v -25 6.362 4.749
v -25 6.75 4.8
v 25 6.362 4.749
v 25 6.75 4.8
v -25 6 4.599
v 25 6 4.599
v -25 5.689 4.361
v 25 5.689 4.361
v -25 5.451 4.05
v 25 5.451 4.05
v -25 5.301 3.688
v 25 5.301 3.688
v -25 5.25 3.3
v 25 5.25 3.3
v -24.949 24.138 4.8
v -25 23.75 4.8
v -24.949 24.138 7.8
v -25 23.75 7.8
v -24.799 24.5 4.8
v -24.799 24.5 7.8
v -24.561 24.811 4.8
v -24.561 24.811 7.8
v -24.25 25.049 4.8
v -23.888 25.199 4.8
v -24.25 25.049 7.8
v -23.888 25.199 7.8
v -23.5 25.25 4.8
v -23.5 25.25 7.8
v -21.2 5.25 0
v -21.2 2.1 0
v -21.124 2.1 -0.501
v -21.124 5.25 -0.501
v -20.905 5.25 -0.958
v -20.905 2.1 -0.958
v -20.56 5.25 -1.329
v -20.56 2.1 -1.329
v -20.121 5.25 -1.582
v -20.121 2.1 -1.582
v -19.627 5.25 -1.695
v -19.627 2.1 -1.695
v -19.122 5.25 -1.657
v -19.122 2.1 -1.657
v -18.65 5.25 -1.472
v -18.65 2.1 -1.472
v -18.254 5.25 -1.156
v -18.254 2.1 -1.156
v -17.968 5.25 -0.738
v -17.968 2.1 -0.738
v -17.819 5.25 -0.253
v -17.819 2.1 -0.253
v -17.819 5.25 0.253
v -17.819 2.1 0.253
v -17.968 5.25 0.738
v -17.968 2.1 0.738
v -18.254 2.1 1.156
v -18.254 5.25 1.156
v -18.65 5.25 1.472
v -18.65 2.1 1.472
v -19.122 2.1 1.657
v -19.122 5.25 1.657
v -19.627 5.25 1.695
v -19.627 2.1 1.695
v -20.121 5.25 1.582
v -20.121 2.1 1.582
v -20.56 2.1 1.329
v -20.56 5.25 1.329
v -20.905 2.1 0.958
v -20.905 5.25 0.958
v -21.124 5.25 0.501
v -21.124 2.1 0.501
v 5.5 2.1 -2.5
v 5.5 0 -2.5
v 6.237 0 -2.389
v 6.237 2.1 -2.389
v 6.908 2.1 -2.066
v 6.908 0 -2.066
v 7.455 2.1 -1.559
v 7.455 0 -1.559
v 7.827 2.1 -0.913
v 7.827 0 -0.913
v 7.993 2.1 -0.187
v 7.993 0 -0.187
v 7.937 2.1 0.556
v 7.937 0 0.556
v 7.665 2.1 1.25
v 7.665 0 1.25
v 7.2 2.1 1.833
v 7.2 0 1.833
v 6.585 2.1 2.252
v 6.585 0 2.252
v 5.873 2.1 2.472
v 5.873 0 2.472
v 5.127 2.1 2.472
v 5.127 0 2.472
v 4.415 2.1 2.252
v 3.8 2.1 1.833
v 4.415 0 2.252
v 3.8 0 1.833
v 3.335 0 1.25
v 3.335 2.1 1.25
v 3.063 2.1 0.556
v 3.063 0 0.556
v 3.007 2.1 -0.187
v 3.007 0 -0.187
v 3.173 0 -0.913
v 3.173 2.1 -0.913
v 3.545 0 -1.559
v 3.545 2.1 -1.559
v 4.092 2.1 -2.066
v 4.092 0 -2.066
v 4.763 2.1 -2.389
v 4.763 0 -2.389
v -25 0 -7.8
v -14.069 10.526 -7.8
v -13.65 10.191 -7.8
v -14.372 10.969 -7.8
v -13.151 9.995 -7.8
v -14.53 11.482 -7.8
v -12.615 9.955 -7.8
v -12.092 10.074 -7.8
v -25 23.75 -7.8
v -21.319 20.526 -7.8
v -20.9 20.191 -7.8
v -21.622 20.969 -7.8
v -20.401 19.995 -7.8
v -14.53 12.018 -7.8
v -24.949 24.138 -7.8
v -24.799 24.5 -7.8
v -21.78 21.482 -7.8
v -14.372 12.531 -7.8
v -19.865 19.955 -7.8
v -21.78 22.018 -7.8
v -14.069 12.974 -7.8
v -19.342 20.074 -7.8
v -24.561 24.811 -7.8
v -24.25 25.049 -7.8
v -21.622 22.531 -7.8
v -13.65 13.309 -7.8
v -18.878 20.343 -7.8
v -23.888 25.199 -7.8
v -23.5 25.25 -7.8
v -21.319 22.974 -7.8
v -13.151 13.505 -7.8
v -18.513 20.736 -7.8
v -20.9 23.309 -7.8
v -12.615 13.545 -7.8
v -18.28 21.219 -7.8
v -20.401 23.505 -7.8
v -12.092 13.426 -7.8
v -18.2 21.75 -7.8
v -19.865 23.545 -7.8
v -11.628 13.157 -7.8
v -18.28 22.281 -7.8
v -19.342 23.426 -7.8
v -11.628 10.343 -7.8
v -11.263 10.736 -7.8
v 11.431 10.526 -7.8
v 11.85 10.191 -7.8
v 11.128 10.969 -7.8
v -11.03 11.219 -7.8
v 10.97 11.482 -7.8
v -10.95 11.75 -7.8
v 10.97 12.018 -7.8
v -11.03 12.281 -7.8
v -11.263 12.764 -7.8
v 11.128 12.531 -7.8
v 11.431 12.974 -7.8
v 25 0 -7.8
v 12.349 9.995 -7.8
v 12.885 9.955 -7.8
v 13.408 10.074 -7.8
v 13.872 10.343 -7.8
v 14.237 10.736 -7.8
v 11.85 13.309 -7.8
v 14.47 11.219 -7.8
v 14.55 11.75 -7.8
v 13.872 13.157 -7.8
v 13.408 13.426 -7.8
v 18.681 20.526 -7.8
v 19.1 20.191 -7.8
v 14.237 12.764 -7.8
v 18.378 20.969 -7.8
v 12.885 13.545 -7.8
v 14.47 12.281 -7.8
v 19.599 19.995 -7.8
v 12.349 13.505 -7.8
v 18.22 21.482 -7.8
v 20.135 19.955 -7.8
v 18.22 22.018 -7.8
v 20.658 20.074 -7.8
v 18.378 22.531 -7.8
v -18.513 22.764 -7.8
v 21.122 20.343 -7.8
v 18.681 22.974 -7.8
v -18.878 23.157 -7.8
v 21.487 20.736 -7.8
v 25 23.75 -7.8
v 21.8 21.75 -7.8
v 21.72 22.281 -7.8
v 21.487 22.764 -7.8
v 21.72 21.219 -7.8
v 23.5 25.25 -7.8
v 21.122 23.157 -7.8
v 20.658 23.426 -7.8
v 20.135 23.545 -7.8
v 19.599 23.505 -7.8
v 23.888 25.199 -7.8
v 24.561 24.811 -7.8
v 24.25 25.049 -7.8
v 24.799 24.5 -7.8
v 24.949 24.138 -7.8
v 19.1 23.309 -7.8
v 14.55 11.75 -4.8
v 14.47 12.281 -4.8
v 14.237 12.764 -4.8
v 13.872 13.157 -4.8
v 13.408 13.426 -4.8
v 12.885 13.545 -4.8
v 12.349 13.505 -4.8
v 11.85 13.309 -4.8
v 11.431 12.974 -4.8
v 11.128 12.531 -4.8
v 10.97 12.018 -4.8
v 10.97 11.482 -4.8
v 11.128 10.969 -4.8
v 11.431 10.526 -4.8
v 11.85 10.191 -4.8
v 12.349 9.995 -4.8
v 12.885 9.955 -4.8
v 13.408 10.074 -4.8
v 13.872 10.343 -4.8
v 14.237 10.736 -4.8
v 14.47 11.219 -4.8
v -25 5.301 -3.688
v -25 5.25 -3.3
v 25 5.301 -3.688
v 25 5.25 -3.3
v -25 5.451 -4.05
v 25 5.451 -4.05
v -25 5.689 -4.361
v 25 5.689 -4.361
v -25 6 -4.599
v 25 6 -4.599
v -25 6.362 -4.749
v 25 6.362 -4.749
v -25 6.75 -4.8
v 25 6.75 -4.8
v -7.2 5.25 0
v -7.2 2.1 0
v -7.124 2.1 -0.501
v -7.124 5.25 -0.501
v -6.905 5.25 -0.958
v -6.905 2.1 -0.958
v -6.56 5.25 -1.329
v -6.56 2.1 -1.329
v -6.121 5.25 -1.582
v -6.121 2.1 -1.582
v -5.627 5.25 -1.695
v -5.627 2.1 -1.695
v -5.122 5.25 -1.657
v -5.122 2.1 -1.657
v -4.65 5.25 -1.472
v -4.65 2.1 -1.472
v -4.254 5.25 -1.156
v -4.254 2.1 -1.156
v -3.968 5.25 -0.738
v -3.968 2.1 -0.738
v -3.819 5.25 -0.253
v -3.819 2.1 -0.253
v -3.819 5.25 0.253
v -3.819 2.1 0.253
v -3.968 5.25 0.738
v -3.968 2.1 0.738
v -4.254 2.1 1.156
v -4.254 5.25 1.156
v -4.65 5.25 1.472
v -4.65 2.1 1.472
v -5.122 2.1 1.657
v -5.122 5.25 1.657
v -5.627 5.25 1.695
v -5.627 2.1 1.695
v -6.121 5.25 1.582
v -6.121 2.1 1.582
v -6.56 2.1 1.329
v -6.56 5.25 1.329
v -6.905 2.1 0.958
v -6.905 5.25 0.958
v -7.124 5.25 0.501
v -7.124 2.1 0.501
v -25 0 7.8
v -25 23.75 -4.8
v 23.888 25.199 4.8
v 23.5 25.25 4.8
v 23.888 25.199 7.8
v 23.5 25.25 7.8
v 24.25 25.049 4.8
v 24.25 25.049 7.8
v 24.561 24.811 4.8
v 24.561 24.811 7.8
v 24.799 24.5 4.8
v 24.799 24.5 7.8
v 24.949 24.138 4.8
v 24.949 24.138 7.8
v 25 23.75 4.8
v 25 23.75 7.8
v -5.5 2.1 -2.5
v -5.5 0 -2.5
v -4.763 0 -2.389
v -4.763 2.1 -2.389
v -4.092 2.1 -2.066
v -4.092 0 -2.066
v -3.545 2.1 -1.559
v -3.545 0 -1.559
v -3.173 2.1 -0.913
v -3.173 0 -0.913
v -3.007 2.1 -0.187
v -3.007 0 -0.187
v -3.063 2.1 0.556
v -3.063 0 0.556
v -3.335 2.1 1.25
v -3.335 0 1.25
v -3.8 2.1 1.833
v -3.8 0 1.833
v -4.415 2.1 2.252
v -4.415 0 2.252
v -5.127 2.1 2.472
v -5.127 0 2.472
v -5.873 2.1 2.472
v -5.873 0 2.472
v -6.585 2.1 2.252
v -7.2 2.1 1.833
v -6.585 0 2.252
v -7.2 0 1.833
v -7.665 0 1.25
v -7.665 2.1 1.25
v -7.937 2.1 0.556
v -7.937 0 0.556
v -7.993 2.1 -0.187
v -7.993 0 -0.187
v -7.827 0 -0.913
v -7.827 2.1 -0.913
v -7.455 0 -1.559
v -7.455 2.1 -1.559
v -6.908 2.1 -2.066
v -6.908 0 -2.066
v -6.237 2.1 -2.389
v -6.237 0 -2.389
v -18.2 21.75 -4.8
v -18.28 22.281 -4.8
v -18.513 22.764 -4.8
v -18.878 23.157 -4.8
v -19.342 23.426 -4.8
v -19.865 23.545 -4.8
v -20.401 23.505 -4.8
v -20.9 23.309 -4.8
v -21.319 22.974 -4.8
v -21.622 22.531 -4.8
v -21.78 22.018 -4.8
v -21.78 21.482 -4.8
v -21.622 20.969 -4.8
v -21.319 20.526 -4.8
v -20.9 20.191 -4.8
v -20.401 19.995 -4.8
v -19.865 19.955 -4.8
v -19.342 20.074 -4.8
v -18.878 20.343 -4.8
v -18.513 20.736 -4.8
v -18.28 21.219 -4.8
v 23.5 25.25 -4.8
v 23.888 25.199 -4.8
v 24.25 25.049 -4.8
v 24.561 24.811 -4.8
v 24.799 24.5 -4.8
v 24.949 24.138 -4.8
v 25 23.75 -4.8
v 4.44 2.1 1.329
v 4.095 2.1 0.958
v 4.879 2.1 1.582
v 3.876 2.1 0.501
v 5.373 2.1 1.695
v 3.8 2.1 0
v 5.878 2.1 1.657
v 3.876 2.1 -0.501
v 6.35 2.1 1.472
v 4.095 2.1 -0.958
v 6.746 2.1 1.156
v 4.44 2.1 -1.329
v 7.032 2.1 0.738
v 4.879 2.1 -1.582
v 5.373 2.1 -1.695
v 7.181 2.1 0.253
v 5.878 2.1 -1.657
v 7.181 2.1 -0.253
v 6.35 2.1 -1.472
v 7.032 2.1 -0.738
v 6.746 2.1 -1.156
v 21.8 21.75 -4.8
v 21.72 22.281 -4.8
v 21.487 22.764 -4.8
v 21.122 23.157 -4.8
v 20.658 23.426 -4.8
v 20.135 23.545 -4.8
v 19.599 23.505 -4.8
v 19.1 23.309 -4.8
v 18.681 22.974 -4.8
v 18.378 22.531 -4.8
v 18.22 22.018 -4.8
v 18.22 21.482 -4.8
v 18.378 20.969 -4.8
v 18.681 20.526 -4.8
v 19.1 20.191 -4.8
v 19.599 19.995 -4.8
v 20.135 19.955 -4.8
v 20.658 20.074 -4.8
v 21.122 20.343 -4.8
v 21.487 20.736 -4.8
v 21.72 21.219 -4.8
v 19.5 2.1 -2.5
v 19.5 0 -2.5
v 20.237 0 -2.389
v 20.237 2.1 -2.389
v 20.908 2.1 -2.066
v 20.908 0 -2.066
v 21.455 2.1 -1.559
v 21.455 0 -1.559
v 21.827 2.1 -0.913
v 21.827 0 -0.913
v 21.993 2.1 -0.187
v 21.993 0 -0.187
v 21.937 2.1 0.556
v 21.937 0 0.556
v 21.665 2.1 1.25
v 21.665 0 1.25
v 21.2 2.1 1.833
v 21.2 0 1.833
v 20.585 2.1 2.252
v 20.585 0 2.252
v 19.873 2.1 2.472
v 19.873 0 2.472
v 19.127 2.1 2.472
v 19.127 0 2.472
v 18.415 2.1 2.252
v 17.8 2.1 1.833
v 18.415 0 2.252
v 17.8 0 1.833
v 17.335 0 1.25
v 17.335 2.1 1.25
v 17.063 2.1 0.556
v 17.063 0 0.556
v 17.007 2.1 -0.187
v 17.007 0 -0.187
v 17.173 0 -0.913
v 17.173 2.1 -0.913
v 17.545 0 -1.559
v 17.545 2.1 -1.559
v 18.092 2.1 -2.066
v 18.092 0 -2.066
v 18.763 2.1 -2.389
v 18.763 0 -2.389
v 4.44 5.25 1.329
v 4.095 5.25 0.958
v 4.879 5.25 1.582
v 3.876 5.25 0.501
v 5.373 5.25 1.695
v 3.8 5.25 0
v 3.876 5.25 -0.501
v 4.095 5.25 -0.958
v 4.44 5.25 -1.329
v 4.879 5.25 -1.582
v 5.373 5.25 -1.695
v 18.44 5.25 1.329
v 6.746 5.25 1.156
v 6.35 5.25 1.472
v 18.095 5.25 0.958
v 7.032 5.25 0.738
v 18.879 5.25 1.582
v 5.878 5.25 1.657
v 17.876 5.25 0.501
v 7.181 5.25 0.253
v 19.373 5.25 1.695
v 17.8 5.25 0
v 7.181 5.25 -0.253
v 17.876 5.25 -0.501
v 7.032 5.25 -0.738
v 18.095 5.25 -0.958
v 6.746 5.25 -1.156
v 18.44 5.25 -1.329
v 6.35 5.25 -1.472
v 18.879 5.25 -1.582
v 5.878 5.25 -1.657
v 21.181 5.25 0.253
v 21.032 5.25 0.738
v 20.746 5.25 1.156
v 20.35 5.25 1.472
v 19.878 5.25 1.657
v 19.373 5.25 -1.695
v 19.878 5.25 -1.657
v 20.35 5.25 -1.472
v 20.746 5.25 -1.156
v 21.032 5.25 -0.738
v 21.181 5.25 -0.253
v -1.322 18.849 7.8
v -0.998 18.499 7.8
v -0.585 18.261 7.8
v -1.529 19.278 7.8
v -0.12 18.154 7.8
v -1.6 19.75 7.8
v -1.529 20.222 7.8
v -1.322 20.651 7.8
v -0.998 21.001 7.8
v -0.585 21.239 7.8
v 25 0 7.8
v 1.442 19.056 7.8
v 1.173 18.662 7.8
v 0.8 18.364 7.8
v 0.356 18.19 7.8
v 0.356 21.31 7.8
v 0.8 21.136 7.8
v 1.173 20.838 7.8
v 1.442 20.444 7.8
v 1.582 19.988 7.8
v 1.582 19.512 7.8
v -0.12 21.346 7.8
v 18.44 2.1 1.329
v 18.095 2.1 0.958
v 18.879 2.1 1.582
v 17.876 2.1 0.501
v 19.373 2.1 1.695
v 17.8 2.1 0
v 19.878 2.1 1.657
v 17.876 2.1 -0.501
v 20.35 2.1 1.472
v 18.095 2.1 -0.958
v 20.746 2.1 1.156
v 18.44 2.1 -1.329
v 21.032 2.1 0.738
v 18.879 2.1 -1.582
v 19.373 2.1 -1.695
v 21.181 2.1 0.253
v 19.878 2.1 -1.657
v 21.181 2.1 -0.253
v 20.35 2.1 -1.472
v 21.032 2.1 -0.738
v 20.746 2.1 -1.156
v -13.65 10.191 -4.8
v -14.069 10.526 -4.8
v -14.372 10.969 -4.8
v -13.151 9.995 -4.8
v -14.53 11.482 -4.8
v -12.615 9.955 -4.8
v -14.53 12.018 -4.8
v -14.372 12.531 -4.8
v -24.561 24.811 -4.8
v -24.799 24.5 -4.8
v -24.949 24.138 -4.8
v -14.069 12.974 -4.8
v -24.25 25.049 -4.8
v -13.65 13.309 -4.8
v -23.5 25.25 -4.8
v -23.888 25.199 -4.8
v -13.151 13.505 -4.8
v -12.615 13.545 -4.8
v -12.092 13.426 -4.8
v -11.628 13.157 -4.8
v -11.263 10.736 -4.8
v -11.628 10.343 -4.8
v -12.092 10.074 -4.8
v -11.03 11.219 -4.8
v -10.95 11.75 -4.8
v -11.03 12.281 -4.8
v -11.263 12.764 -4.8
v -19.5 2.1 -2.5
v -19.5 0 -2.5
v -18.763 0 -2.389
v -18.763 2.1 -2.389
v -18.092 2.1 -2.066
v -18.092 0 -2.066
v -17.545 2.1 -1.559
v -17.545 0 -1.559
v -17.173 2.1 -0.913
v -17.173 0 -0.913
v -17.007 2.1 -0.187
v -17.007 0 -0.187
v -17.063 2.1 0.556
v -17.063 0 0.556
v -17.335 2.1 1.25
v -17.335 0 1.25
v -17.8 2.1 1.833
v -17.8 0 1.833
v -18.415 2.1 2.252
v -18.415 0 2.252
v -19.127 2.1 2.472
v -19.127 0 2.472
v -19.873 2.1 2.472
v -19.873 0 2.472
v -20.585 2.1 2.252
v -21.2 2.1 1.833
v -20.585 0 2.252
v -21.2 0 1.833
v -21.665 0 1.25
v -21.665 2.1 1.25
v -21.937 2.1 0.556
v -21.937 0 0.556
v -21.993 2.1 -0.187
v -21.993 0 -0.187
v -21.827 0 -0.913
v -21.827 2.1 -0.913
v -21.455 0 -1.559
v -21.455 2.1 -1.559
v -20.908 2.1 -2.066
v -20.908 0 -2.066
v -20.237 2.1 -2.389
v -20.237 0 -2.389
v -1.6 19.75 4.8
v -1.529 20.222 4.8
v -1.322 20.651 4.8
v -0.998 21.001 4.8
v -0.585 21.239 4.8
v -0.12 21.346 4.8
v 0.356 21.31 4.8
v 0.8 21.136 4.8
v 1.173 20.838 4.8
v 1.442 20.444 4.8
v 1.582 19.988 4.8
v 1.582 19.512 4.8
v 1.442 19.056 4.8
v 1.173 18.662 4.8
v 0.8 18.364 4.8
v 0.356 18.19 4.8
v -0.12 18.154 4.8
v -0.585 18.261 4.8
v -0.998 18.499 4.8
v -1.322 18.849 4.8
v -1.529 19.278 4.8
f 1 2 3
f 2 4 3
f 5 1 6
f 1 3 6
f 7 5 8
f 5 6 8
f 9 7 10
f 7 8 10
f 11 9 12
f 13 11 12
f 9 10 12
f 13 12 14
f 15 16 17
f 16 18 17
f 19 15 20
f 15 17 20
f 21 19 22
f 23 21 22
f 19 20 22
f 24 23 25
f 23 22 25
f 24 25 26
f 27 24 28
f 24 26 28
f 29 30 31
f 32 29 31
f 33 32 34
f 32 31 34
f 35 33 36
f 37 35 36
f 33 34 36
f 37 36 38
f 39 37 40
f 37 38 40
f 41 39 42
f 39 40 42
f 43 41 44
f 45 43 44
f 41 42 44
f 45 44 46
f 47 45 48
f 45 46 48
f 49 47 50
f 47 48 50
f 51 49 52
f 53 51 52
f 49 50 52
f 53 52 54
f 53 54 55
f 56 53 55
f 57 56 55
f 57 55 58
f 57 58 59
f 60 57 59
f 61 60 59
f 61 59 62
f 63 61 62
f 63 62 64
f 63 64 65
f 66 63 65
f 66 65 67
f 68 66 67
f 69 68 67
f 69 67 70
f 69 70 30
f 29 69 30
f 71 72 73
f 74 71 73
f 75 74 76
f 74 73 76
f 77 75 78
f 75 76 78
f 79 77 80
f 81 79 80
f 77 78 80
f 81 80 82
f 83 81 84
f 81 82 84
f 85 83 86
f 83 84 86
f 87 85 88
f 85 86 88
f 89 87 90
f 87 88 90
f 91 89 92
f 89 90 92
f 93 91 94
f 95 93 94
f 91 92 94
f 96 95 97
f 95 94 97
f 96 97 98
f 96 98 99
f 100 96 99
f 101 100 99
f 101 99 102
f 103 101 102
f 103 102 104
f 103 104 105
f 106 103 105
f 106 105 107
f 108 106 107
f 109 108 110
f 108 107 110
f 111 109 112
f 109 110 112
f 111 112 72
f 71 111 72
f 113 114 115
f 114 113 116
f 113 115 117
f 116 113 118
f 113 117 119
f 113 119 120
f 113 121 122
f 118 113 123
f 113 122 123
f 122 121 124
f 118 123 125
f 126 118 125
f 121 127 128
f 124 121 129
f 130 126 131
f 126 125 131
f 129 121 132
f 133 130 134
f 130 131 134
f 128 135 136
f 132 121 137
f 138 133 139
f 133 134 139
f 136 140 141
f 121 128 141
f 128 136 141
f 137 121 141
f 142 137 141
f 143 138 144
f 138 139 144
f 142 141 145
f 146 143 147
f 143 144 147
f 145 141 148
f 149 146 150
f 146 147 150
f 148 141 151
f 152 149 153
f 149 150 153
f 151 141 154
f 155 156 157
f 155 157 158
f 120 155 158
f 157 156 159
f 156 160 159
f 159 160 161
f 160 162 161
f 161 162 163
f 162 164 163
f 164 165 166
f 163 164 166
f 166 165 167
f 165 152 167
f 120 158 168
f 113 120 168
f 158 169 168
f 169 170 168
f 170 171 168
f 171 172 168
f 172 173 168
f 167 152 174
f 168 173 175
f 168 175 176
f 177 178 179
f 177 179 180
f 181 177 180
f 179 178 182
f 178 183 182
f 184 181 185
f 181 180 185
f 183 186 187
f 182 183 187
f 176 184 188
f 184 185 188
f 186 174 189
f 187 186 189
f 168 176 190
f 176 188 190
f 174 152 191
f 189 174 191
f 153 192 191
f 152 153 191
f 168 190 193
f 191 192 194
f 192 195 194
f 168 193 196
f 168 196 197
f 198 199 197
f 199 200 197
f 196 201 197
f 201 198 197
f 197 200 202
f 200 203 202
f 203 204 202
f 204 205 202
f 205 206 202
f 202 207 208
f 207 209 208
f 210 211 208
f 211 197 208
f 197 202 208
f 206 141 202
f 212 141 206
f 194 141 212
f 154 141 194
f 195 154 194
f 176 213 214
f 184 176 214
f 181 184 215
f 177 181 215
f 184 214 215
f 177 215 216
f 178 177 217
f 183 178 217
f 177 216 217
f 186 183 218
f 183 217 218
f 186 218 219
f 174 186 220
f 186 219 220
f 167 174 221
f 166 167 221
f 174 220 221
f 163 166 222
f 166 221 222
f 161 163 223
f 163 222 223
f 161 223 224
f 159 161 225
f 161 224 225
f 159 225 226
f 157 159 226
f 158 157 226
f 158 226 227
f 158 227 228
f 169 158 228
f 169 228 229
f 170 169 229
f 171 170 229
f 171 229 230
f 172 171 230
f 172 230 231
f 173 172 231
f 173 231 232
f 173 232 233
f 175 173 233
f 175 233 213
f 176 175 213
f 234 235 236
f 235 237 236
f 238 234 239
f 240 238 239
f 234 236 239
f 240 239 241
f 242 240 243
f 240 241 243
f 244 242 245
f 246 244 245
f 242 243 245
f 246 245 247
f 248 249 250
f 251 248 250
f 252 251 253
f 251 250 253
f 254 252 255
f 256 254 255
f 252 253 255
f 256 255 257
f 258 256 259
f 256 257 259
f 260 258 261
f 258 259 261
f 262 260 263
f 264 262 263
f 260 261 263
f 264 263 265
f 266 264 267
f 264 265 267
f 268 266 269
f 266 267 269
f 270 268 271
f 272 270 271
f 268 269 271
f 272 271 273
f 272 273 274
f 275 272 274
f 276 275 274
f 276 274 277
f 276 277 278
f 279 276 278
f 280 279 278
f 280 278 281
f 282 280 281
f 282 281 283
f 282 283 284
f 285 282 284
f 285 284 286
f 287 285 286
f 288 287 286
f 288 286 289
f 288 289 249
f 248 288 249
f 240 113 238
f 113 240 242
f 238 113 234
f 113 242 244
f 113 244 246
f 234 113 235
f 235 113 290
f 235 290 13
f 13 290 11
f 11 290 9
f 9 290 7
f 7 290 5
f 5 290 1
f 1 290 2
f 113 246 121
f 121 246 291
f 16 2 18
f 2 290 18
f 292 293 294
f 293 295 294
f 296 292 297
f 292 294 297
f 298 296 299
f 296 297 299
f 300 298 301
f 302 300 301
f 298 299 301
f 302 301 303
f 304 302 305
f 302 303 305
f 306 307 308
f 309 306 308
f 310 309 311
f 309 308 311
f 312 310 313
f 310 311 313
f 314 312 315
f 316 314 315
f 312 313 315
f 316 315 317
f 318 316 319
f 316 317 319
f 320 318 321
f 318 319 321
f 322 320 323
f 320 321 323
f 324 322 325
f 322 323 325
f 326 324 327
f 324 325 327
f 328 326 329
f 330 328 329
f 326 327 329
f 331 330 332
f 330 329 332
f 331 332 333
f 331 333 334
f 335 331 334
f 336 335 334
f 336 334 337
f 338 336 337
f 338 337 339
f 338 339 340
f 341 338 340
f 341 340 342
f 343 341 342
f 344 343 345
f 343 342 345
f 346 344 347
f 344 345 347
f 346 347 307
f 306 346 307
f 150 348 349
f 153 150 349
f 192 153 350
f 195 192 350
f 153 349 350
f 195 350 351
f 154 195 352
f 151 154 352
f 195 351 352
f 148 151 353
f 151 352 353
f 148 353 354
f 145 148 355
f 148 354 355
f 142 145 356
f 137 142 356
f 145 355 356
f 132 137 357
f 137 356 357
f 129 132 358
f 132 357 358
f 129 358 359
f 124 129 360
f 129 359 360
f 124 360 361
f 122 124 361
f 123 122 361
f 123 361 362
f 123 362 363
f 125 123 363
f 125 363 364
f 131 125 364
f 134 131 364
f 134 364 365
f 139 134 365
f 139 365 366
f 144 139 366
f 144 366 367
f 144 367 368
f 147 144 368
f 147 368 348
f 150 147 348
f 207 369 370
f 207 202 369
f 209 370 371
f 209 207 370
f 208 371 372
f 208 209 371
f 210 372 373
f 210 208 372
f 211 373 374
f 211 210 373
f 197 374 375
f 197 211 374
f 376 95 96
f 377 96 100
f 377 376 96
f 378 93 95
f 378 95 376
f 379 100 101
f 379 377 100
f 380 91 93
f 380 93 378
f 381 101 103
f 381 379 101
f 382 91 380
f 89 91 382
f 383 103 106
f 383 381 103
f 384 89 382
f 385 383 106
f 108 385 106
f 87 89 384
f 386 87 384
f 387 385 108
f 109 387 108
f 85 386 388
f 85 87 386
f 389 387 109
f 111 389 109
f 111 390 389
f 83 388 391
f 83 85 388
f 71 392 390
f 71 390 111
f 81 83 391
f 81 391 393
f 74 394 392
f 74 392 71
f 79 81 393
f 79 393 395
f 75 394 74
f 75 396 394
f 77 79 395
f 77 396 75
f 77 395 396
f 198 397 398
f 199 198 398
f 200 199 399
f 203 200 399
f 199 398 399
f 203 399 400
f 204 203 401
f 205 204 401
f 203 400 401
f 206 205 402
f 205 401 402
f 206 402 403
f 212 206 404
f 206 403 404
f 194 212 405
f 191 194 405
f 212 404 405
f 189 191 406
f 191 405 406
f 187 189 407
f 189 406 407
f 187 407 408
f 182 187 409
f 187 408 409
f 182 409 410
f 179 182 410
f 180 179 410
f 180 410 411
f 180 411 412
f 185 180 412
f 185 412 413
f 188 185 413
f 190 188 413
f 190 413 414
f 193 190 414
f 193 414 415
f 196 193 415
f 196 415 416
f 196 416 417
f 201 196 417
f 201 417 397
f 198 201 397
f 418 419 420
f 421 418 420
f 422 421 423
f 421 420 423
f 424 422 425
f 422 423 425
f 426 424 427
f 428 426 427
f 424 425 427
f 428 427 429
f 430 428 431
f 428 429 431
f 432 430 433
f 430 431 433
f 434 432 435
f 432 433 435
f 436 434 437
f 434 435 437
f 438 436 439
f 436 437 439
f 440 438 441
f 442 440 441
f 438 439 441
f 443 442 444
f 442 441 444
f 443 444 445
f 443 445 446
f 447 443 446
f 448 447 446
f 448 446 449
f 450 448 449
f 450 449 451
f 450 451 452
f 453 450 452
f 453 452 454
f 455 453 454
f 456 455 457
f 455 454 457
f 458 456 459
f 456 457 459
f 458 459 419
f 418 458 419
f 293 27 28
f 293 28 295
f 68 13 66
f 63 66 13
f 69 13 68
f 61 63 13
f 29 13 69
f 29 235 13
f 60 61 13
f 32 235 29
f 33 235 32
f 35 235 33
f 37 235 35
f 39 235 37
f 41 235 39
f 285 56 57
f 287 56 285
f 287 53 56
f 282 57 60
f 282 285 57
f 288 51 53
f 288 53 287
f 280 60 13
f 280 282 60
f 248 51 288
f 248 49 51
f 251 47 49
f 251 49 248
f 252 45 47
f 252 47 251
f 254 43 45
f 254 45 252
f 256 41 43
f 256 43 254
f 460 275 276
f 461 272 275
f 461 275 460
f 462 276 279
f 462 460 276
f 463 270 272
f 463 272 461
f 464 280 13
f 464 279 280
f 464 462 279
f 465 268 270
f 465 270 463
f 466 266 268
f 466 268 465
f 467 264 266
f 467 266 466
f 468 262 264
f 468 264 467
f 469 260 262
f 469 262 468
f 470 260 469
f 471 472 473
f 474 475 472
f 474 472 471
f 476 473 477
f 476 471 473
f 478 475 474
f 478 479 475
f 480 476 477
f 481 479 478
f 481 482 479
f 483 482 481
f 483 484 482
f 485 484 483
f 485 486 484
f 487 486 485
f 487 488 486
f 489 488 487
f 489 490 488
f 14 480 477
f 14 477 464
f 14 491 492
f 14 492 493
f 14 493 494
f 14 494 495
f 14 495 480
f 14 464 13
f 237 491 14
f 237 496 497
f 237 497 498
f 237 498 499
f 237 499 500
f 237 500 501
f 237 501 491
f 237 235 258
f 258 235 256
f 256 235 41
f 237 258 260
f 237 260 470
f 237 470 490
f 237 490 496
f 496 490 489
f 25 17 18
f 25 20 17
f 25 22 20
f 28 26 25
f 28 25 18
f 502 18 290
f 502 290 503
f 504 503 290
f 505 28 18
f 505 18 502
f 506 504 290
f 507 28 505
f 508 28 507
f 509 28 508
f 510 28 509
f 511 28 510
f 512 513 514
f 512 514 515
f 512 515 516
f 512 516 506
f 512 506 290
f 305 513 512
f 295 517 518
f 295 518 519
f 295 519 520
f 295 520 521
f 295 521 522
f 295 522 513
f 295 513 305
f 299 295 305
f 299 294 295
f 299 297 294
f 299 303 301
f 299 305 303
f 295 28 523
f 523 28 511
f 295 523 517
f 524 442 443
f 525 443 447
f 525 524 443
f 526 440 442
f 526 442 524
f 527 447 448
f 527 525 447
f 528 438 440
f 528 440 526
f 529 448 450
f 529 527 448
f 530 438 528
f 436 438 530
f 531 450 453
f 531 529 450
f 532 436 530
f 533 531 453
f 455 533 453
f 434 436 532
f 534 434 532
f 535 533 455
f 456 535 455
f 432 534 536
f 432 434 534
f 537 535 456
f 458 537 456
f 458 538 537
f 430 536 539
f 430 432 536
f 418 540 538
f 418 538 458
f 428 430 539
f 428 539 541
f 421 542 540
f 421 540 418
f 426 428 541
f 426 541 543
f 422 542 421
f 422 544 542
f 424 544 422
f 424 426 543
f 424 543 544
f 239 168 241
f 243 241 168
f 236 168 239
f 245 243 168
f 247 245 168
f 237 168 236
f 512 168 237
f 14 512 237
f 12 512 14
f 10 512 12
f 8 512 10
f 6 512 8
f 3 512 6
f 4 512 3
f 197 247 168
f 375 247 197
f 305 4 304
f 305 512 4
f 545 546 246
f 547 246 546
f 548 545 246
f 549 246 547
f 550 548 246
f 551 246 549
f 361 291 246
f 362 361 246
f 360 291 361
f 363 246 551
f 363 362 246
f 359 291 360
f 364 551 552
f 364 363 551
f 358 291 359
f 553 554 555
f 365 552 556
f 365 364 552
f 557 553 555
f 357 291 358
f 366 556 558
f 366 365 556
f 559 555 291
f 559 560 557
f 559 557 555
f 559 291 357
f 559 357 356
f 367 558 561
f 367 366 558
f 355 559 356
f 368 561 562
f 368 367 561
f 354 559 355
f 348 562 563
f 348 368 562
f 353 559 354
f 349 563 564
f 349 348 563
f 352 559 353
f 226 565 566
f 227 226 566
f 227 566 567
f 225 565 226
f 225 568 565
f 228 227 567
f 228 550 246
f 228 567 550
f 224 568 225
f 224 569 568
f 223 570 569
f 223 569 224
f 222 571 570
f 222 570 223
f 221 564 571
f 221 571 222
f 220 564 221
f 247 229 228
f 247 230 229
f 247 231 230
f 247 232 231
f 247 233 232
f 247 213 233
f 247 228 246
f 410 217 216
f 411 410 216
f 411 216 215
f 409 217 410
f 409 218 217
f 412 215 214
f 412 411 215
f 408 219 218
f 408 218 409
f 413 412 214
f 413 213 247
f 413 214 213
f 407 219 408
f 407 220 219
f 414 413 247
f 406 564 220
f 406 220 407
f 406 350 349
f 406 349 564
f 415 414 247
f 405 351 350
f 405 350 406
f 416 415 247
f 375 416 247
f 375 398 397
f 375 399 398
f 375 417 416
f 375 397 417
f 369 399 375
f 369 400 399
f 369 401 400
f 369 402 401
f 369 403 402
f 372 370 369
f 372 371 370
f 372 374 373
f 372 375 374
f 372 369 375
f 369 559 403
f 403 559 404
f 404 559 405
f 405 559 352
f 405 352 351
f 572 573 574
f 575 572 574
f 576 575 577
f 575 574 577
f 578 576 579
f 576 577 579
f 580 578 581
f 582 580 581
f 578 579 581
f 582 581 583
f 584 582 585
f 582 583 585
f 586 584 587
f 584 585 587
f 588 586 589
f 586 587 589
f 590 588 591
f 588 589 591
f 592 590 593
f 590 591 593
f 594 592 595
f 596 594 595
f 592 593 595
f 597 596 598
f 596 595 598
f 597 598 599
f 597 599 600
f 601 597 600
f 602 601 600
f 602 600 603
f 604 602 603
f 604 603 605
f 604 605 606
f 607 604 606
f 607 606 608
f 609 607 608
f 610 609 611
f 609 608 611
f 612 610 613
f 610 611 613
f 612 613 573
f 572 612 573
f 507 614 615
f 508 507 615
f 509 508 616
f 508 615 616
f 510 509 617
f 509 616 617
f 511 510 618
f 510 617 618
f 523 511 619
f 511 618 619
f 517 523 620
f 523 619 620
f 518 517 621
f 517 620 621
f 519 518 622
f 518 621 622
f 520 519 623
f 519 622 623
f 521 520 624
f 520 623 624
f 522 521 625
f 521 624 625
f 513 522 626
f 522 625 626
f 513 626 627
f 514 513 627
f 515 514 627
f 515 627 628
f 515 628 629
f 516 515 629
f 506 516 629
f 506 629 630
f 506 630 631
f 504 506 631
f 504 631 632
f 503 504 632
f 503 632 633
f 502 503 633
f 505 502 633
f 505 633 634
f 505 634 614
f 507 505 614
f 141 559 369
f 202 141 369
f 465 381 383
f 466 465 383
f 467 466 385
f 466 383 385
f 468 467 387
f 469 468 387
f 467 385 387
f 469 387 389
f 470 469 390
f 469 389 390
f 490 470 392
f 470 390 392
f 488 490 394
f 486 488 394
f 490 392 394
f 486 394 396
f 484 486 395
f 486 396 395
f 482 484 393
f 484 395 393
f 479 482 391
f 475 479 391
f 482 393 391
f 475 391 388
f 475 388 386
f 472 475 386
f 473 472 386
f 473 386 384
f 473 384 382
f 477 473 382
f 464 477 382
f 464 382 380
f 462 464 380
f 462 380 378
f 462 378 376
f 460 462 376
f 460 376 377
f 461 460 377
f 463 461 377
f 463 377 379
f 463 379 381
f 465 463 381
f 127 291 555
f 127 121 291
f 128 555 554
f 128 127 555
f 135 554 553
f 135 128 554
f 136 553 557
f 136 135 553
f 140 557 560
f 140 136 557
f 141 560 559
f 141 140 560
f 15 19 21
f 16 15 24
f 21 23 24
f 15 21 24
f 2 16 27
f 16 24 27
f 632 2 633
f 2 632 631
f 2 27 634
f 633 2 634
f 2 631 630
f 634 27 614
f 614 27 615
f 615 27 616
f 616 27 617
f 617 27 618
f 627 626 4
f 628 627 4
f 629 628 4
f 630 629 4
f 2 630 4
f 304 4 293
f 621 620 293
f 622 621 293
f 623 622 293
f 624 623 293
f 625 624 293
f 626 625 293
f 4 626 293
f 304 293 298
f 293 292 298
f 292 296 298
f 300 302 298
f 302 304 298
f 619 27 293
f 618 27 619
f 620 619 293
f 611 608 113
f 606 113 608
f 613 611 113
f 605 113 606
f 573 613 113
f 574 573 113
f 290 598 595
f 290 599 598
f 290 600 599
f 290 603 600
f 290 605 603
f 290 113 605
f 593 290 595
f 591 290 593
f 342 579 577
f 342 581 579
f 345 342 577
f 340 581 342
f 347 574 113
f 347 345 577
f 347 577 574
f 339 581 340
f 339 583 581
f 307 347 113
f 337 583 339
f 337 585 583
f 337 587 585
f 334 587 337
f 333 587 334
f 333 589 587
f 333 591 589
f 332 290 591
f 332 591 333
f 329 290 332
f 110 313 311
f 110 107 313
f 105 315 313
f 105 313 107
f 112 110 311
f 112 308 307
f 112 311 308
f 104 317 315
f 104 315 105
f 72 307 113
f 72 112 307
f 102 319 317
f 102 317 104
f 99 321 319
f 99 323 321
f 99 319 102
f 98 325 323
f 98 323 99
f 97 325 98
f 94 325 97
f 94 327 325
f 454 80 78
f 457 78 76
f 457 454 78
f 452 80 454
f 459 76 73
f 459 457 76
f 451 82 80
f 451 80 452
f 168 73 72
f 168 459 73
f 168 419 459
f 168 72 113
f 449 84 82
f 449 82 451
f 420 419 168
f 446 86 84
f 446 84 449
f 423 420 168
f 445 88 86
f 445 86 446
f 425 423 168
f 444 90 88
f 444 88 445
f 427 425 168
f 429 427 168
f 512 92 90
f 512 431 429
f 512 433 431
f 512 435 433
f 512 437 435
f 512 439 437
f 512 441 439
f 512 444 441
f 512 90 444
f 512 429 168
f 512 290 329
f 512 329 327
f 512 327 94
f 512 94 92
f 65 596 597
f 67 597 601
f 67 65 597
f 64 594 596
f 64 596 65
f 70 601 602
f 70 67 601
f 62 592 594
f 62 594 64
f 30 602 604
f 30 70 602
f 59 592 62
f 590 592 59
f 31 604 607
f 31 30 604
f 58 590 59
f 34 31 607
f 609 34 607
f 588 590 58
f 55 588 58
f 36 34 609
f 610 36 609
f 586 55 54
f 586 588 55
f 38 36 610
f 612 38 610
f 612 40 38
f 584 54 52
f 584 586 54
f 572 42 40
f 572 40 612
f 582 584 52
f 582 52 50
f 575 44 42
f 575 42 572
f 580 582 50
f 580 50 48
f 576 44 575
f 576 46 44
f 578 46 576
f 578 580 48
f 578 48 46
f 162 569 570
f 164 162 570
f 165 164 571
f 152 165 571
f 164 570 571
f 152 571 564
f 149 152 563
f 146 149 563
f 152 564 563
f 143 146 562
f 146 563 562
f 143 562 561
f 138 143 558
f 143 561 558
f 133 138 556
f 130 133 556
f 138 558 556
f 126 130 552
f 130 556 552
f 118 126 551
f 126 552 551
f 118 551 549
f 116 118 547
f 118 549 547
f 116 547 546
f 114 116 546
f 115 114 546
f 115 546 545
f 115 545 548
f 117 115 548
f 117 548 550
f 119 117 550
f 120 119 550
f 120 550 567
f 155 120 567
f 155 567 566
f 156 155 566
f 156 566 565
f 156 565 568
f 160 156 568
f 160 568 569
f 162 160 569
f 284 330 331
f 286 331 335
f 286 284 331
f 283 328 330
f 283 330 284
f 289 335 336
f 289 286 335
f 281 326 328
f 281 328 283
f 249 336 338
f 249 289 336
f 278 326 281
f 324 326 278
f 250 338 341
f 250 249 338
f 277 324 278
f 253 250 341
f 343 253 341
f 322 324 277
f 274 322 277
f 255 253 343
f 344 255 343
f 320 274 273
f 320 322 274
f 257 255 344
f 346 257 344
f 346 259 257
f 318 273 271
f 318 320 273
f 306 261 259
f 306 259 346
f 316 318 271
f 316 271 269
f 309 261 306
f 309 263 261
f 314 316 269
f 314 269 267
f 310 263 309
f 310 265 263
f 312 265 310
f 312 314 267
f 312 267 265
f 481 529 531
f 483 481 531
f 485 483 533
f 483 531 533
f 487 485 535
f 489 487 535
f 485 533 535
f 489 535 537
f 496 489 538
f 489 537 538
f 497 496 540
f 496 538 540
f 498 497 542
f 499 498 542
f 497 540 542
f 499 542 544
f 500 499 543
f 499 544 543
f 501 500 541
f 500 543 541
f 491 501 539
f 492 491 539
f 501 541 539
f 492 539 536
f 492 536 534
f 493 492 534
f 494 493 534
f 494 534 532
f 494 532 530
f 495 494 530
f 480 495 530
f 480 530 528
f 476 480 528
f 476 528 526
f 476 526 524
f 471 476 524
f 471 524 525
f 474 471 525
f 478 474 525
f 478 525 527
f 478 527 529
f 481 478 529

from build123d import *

# Parameters (mm, degrees)
SKETCH1_W                = 50
SKETCH1_H                = 9.6
BOSS_EXTRUDE1_DEPTH      = 5.25
SKETCH2_R                = 2.5
CUT_EXTRUDE1_DEPTH       = 2.1
M3_CLEARANCE_HOLE1_D     = 3.4
M3_CLEARANCE_HOLE1_DEPTH = 7.978536948
M3_CLEARANCE_HOLE1_TIP   = 1.021463052
SKETCH5_W                = 50
SKETCH5_H                = 25.25
BOSS_EXTRUDE2_DEPTH      = 3
FILLET1_R                = 1.5
M3_CLEARANCE_HOLE4_D     = 3.2
M3_CLEARANCE_HOLE4_DEPTH = 3.03862301
M3_CLEARANCE_HOLE4_TIP   = 0.96137699
M3_CLEARANCE_HOLE5_D     = 3.6
M3_CLEARANCE_HOLE5_DEPTH = 3.918450886
M3_CLEARANCE_HOLE5_TIP   = 1.081549114
FILLET2_R                = 1.5


with BuildPart() as part:
    # Sketch1 → Boss-Extrude1 (new body)
    with BuildSketch(Plane(origin=(0, 0, 0), x_dir=(1, 0, 0), z_dir=(0, 1, 0))):
        Rectangle(SKETCH1_W, SKETCH1_H)
    extrude(amount=BOSS_EXTRUDE1_DEPTH)

    # Sketch2 → Cut-Extrude1 (cut)
    with BuildSketch(Plane.XZ):
        with Locations(Location((-19.5, 0, 0), (0, 0, 270))):
            Circle(SKETCH2_R)
        with Locations(Location((-5.5, 0, 0), (0, 0, 270))):
            Circle(SKETCH2_R)
        with Locations(Location((5.5, 0, 0), (0, 0, 270))):
            Circle(SKETCH2_R)
        with Locations(Location((19.5, 0, 0), (0, 0, 270))):
            Circle(SKETCH2_R)
    extrude(amount=-CUT_EXTRUDE1_DEPTH, mode=Mode.SUBTRACT)

    # M3 Clearance Hole1
    with Locations(Plane(origin=(0, 5.25, 0), x_dir=(1, 0, 0), z_dir=(0, 1, 0))):
        with Locations((-19.5, 0), (-5.5, 0), (5.5, 0), (19.5, 0)):
            Hole(M3_CLEARANCE_HOLE1_D / 2, depth=M3_CLEARANCE_HOLE1_DEPTH)
            with Locations((0, 0, -(M3_CLEARANCE_HOLE1_DEPTH + M3_CLEARANCE_HOLE1_TIP / 2))):  # 118° drill point
                Cone(0, M3_CLEARANCE_HOLE1_D / 2, M3_CLEARANCE_HOLE1_TIP, mode=Mode.SUBTRACT)

    # Sketch5 → Boss-Extrude2 (add)
    with BuildSketch(Plane.XY.offset(4.8)):
        with Locations((0, 12.625)):
            Rectangle(SKETCH5_W, SKETCH5_H)
    boss_extrude2 = extrude(amount=BOSS_EXTRUDE2_DEPTH)

    # Mirror1: Boss-Extrude2 across plane
    add(boss_extrude2.mirror(Plane.XY))

    # Fillet1
    fillet1_edges = [part.edges().sort_by_distance(p)[0] for p in [
        (0, 5.25, 4.8),
        (0, 5.25, -4.8),
    ]]
    fillet(fillet1_edges, radius=FILLET1_R)

    # M3 Clearance Hole4
    with Locations(Plane.XY.offset(7.8)):
        with Locations((0, 19.75)):
            Hole(M3_CLEARANCE_HOLE4_D / 2, depth=M3_CLEARANCE_HOLE4_DEPTH)
            with Locations((0, 0, -(M3_CLEARANCE_HOLE4_DEPTH + M3_CLEARANCE_HOLE4_TIP / 2))):  # 118° drill point
                Cone(0, M3_CLEARANCE_HOLE4_D / 2, M3_CLEARANCE_HOLE4_TIP, mode=Mode.SUBTRACT)

    # M3 Clearance Hole5
    with Locations(Plane(origin=(0, 0, -7.8), x_dir=(-1, 0, 0), z_dir=(0, 0, -1))):
        with Locations((-20, 21.75), (20, 21.75), (12.75, 11.75), (-12.75, 11.75)):
            Hole(M3_CLEARANCE_HOLE5_D / 2, depth=M3_CLEARANCE_HOLE5_DEPTH)
            with Locations((0, 0, -(M3_CLEARANCE_HOLE5_DEPTH + M3_CLEARANCE_HOLE5_TIP / 2))):  # 118° drill point
                Cone(0, M3_CLEARANCE_HOLE5_D / 2, M3_CLEARANCE_HOLE5_TIP, mode=Mode.SUBTRACT)

    # Fillet2
    fillet2_edges = [part.edges().sort_by_distance(p)[0] for p in [
        (-25, 25.25, 6.3),
        (25, 25.25, 6.3),
        (-25, 25.25, -6.3),
        (25, 25.25, -6.3),
    ]]
    fillet(fillet2_edges, radius=FILLET2_R)


solid = part.part
